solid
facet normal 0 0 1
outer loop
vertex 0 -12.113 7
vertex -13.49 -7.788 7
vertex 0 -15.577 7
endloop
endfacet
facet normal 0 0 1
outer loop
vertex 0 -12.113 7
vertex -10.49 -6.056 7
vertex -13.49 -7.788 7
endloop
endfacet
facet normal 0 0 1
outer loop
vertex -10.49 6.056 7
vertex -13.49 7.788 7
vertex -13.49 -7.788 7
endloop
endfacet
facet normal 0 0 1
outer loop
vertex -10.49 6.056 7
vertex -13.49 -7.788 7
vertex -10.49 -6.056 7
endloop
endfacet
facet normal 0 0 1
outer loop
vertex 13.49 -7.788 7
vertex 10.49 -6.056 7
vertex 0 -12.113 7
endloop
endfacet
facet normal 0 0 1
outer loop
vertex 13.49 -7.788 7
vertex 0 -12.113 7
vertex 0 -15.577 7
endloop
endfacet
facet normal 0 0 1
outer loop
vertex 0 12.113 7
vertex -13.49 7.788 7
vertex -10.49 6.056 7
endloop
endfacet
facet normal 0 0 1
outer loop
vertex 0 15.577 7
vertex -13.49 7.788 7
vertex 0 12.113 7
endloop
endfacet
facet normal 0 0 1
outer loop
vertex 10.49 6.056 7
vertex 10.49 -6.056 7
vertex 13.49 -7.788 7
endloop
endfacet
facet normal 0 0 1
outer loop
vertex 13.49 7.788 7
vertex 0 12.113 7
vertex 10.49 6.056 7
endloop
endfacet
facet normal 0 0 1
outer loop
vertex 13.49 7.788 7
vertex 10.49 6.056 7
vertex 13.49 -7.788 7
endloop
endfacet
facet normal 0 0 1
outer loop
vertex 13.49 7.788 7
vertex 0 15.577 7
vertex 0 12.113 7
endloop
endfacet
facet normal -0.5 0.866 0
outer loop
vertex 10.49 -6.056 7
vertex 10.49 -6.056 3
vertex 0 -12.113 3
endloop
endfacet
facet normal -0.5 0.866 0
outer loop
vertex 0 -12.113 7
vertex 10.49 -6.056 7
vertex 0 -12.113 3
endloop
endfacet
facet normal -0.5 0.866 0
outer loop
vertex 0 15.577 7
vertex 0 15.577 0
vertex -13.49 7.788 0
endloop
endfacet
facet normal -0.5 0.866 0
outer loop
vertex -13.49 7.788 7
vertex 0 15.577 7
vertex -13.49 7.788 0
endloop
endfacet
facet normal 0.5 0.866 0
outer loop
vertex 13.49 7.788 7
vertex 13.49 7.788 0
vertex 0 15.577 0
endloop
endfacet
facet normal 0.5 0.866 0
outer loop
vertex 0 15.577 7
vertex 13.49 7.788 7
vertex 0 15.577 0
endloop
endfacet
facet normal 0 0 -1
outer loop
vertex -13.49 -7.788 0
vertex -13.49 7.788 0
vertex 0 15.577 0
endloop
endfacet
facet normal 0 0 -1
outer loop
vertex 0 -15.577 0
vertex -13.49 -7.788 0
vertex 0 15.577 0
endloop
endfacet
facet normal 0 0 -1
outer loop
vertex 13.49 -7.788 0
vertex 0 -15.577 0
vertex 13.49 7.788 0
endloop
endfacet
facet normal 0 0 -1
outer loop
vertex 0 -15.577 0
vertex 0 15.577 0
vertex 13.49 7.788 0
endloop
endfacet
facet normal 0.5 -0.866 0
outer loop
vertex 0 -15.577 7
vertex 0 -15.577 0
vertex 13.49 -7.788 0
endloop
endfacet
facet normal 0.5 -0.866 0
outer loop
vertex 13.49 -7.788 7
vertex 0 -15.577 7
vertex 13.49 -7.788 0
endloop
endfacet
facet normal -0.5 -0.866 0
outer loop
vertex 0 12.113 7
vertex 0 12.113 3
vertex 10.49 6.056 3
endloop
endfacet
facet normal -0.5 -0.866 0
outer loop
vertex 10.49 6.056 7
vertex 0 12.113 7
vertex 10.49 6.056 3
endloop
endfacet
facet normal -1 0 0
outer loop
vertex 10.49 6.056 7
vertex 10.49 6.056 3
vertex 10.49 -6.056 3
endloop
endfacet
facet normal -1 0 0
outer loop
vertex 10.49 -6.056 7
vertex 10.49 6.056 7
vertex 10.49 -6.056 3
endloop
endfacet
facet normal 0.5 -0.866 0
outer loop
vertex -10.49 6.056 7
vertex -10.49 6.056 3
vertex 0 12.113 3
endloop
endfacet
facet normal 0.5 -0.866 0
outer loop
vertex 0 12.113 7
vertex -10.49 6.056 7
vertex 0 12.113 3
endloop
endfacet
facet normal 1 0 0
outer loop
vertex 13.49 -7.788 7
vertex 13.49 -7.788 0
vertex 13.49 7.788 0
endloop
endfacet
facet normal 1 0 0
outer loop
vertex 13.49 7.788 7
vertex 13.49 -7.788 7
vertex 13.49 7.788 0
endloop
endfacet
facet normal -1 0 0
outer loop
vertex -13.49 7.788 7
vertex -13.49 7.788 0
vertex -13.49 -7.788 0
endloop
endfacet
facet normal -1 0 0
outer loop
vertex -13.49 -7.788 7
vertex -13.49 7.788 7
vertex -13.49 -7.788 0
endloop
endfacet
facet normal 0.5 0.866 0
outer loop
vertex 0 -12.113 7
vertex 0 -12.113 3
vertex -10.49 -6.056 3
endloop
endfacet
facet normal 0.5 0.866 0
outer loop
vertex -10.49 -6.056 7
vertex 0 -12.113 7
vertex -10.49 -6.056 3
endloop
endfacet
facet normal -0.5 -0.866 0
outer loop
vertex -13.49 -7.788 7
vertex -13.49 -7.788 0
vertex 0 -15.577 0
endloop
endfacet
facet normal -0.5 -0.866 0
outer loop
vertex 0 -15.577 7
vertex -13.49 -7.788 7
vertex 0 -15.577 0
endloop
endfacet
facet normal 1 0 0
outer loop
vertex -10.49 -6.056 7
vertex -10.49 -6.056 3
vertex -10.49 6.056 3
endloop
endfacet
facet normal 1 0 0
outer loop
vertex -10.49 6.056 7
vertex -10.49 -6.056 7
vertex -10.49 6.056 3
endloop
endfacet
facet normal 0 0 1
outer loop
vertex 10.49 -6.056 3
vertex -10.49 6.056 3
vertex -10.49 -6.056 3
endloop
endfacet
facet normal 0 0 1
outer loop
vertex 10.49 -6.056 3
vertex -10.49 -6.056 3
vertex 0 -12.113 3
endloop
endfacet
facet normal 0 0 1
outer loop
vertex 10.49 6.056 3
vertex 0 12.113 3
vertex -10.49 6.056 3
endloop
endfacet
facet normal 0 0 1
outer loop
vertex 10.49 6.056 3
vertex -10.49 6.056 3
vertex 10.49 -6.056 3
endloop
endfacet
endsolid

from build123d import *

# Parameters (mm, degrees)
F1_DEPTH = 3
F2_DEPTH = 7


with BuildPart() as f1:
    # F0 (on Top) → F1 (new body)
    with BuildSketch(Plane.XY):
        Polygon((-13.49, 7.788455), (-13.49, -7.788455), (0, -15.57691), (13.49, -7.788455), (13.49, 7.788455), (0, 15.57691), align=None)
        Polygon((0, 12.112809), (10.49, 6.056404), (10.49, -6.056404), (0, -12.112809), (-10.49, -6.056404), (-10.49, 6.056404), align=None, mode=Mode.SUBTRACT)
        Polygon((10.49, -6.056404), (10.49, 6.056404), (0, 12.112809), (-10.49, 6.056404), (-10.49, -6.056404), (0, -12.112809), align=None)
    extrude(amount=F1_DEPTH)

    # F0 (on Top) → F2 (join)
    with BuildSketch(Plane.XY):
        Polygon((-13.49, 7.788455), (-13.49, -7.788455), (0, -15.57691), (13.49, -7.788455), (13.49, 7.788455), (0, 15.57691), align=None)
        Polygon((0, 12.112809), (10.49, 6.056404), (10.49, -6.056404), (0, -12.112809), (-10.49, -6.056404), (-10.49, 6.056404), align=None, mode=Mode.SUBTRACT)
    extrude(amount=F2_DEPTH)


solid = f1.part
